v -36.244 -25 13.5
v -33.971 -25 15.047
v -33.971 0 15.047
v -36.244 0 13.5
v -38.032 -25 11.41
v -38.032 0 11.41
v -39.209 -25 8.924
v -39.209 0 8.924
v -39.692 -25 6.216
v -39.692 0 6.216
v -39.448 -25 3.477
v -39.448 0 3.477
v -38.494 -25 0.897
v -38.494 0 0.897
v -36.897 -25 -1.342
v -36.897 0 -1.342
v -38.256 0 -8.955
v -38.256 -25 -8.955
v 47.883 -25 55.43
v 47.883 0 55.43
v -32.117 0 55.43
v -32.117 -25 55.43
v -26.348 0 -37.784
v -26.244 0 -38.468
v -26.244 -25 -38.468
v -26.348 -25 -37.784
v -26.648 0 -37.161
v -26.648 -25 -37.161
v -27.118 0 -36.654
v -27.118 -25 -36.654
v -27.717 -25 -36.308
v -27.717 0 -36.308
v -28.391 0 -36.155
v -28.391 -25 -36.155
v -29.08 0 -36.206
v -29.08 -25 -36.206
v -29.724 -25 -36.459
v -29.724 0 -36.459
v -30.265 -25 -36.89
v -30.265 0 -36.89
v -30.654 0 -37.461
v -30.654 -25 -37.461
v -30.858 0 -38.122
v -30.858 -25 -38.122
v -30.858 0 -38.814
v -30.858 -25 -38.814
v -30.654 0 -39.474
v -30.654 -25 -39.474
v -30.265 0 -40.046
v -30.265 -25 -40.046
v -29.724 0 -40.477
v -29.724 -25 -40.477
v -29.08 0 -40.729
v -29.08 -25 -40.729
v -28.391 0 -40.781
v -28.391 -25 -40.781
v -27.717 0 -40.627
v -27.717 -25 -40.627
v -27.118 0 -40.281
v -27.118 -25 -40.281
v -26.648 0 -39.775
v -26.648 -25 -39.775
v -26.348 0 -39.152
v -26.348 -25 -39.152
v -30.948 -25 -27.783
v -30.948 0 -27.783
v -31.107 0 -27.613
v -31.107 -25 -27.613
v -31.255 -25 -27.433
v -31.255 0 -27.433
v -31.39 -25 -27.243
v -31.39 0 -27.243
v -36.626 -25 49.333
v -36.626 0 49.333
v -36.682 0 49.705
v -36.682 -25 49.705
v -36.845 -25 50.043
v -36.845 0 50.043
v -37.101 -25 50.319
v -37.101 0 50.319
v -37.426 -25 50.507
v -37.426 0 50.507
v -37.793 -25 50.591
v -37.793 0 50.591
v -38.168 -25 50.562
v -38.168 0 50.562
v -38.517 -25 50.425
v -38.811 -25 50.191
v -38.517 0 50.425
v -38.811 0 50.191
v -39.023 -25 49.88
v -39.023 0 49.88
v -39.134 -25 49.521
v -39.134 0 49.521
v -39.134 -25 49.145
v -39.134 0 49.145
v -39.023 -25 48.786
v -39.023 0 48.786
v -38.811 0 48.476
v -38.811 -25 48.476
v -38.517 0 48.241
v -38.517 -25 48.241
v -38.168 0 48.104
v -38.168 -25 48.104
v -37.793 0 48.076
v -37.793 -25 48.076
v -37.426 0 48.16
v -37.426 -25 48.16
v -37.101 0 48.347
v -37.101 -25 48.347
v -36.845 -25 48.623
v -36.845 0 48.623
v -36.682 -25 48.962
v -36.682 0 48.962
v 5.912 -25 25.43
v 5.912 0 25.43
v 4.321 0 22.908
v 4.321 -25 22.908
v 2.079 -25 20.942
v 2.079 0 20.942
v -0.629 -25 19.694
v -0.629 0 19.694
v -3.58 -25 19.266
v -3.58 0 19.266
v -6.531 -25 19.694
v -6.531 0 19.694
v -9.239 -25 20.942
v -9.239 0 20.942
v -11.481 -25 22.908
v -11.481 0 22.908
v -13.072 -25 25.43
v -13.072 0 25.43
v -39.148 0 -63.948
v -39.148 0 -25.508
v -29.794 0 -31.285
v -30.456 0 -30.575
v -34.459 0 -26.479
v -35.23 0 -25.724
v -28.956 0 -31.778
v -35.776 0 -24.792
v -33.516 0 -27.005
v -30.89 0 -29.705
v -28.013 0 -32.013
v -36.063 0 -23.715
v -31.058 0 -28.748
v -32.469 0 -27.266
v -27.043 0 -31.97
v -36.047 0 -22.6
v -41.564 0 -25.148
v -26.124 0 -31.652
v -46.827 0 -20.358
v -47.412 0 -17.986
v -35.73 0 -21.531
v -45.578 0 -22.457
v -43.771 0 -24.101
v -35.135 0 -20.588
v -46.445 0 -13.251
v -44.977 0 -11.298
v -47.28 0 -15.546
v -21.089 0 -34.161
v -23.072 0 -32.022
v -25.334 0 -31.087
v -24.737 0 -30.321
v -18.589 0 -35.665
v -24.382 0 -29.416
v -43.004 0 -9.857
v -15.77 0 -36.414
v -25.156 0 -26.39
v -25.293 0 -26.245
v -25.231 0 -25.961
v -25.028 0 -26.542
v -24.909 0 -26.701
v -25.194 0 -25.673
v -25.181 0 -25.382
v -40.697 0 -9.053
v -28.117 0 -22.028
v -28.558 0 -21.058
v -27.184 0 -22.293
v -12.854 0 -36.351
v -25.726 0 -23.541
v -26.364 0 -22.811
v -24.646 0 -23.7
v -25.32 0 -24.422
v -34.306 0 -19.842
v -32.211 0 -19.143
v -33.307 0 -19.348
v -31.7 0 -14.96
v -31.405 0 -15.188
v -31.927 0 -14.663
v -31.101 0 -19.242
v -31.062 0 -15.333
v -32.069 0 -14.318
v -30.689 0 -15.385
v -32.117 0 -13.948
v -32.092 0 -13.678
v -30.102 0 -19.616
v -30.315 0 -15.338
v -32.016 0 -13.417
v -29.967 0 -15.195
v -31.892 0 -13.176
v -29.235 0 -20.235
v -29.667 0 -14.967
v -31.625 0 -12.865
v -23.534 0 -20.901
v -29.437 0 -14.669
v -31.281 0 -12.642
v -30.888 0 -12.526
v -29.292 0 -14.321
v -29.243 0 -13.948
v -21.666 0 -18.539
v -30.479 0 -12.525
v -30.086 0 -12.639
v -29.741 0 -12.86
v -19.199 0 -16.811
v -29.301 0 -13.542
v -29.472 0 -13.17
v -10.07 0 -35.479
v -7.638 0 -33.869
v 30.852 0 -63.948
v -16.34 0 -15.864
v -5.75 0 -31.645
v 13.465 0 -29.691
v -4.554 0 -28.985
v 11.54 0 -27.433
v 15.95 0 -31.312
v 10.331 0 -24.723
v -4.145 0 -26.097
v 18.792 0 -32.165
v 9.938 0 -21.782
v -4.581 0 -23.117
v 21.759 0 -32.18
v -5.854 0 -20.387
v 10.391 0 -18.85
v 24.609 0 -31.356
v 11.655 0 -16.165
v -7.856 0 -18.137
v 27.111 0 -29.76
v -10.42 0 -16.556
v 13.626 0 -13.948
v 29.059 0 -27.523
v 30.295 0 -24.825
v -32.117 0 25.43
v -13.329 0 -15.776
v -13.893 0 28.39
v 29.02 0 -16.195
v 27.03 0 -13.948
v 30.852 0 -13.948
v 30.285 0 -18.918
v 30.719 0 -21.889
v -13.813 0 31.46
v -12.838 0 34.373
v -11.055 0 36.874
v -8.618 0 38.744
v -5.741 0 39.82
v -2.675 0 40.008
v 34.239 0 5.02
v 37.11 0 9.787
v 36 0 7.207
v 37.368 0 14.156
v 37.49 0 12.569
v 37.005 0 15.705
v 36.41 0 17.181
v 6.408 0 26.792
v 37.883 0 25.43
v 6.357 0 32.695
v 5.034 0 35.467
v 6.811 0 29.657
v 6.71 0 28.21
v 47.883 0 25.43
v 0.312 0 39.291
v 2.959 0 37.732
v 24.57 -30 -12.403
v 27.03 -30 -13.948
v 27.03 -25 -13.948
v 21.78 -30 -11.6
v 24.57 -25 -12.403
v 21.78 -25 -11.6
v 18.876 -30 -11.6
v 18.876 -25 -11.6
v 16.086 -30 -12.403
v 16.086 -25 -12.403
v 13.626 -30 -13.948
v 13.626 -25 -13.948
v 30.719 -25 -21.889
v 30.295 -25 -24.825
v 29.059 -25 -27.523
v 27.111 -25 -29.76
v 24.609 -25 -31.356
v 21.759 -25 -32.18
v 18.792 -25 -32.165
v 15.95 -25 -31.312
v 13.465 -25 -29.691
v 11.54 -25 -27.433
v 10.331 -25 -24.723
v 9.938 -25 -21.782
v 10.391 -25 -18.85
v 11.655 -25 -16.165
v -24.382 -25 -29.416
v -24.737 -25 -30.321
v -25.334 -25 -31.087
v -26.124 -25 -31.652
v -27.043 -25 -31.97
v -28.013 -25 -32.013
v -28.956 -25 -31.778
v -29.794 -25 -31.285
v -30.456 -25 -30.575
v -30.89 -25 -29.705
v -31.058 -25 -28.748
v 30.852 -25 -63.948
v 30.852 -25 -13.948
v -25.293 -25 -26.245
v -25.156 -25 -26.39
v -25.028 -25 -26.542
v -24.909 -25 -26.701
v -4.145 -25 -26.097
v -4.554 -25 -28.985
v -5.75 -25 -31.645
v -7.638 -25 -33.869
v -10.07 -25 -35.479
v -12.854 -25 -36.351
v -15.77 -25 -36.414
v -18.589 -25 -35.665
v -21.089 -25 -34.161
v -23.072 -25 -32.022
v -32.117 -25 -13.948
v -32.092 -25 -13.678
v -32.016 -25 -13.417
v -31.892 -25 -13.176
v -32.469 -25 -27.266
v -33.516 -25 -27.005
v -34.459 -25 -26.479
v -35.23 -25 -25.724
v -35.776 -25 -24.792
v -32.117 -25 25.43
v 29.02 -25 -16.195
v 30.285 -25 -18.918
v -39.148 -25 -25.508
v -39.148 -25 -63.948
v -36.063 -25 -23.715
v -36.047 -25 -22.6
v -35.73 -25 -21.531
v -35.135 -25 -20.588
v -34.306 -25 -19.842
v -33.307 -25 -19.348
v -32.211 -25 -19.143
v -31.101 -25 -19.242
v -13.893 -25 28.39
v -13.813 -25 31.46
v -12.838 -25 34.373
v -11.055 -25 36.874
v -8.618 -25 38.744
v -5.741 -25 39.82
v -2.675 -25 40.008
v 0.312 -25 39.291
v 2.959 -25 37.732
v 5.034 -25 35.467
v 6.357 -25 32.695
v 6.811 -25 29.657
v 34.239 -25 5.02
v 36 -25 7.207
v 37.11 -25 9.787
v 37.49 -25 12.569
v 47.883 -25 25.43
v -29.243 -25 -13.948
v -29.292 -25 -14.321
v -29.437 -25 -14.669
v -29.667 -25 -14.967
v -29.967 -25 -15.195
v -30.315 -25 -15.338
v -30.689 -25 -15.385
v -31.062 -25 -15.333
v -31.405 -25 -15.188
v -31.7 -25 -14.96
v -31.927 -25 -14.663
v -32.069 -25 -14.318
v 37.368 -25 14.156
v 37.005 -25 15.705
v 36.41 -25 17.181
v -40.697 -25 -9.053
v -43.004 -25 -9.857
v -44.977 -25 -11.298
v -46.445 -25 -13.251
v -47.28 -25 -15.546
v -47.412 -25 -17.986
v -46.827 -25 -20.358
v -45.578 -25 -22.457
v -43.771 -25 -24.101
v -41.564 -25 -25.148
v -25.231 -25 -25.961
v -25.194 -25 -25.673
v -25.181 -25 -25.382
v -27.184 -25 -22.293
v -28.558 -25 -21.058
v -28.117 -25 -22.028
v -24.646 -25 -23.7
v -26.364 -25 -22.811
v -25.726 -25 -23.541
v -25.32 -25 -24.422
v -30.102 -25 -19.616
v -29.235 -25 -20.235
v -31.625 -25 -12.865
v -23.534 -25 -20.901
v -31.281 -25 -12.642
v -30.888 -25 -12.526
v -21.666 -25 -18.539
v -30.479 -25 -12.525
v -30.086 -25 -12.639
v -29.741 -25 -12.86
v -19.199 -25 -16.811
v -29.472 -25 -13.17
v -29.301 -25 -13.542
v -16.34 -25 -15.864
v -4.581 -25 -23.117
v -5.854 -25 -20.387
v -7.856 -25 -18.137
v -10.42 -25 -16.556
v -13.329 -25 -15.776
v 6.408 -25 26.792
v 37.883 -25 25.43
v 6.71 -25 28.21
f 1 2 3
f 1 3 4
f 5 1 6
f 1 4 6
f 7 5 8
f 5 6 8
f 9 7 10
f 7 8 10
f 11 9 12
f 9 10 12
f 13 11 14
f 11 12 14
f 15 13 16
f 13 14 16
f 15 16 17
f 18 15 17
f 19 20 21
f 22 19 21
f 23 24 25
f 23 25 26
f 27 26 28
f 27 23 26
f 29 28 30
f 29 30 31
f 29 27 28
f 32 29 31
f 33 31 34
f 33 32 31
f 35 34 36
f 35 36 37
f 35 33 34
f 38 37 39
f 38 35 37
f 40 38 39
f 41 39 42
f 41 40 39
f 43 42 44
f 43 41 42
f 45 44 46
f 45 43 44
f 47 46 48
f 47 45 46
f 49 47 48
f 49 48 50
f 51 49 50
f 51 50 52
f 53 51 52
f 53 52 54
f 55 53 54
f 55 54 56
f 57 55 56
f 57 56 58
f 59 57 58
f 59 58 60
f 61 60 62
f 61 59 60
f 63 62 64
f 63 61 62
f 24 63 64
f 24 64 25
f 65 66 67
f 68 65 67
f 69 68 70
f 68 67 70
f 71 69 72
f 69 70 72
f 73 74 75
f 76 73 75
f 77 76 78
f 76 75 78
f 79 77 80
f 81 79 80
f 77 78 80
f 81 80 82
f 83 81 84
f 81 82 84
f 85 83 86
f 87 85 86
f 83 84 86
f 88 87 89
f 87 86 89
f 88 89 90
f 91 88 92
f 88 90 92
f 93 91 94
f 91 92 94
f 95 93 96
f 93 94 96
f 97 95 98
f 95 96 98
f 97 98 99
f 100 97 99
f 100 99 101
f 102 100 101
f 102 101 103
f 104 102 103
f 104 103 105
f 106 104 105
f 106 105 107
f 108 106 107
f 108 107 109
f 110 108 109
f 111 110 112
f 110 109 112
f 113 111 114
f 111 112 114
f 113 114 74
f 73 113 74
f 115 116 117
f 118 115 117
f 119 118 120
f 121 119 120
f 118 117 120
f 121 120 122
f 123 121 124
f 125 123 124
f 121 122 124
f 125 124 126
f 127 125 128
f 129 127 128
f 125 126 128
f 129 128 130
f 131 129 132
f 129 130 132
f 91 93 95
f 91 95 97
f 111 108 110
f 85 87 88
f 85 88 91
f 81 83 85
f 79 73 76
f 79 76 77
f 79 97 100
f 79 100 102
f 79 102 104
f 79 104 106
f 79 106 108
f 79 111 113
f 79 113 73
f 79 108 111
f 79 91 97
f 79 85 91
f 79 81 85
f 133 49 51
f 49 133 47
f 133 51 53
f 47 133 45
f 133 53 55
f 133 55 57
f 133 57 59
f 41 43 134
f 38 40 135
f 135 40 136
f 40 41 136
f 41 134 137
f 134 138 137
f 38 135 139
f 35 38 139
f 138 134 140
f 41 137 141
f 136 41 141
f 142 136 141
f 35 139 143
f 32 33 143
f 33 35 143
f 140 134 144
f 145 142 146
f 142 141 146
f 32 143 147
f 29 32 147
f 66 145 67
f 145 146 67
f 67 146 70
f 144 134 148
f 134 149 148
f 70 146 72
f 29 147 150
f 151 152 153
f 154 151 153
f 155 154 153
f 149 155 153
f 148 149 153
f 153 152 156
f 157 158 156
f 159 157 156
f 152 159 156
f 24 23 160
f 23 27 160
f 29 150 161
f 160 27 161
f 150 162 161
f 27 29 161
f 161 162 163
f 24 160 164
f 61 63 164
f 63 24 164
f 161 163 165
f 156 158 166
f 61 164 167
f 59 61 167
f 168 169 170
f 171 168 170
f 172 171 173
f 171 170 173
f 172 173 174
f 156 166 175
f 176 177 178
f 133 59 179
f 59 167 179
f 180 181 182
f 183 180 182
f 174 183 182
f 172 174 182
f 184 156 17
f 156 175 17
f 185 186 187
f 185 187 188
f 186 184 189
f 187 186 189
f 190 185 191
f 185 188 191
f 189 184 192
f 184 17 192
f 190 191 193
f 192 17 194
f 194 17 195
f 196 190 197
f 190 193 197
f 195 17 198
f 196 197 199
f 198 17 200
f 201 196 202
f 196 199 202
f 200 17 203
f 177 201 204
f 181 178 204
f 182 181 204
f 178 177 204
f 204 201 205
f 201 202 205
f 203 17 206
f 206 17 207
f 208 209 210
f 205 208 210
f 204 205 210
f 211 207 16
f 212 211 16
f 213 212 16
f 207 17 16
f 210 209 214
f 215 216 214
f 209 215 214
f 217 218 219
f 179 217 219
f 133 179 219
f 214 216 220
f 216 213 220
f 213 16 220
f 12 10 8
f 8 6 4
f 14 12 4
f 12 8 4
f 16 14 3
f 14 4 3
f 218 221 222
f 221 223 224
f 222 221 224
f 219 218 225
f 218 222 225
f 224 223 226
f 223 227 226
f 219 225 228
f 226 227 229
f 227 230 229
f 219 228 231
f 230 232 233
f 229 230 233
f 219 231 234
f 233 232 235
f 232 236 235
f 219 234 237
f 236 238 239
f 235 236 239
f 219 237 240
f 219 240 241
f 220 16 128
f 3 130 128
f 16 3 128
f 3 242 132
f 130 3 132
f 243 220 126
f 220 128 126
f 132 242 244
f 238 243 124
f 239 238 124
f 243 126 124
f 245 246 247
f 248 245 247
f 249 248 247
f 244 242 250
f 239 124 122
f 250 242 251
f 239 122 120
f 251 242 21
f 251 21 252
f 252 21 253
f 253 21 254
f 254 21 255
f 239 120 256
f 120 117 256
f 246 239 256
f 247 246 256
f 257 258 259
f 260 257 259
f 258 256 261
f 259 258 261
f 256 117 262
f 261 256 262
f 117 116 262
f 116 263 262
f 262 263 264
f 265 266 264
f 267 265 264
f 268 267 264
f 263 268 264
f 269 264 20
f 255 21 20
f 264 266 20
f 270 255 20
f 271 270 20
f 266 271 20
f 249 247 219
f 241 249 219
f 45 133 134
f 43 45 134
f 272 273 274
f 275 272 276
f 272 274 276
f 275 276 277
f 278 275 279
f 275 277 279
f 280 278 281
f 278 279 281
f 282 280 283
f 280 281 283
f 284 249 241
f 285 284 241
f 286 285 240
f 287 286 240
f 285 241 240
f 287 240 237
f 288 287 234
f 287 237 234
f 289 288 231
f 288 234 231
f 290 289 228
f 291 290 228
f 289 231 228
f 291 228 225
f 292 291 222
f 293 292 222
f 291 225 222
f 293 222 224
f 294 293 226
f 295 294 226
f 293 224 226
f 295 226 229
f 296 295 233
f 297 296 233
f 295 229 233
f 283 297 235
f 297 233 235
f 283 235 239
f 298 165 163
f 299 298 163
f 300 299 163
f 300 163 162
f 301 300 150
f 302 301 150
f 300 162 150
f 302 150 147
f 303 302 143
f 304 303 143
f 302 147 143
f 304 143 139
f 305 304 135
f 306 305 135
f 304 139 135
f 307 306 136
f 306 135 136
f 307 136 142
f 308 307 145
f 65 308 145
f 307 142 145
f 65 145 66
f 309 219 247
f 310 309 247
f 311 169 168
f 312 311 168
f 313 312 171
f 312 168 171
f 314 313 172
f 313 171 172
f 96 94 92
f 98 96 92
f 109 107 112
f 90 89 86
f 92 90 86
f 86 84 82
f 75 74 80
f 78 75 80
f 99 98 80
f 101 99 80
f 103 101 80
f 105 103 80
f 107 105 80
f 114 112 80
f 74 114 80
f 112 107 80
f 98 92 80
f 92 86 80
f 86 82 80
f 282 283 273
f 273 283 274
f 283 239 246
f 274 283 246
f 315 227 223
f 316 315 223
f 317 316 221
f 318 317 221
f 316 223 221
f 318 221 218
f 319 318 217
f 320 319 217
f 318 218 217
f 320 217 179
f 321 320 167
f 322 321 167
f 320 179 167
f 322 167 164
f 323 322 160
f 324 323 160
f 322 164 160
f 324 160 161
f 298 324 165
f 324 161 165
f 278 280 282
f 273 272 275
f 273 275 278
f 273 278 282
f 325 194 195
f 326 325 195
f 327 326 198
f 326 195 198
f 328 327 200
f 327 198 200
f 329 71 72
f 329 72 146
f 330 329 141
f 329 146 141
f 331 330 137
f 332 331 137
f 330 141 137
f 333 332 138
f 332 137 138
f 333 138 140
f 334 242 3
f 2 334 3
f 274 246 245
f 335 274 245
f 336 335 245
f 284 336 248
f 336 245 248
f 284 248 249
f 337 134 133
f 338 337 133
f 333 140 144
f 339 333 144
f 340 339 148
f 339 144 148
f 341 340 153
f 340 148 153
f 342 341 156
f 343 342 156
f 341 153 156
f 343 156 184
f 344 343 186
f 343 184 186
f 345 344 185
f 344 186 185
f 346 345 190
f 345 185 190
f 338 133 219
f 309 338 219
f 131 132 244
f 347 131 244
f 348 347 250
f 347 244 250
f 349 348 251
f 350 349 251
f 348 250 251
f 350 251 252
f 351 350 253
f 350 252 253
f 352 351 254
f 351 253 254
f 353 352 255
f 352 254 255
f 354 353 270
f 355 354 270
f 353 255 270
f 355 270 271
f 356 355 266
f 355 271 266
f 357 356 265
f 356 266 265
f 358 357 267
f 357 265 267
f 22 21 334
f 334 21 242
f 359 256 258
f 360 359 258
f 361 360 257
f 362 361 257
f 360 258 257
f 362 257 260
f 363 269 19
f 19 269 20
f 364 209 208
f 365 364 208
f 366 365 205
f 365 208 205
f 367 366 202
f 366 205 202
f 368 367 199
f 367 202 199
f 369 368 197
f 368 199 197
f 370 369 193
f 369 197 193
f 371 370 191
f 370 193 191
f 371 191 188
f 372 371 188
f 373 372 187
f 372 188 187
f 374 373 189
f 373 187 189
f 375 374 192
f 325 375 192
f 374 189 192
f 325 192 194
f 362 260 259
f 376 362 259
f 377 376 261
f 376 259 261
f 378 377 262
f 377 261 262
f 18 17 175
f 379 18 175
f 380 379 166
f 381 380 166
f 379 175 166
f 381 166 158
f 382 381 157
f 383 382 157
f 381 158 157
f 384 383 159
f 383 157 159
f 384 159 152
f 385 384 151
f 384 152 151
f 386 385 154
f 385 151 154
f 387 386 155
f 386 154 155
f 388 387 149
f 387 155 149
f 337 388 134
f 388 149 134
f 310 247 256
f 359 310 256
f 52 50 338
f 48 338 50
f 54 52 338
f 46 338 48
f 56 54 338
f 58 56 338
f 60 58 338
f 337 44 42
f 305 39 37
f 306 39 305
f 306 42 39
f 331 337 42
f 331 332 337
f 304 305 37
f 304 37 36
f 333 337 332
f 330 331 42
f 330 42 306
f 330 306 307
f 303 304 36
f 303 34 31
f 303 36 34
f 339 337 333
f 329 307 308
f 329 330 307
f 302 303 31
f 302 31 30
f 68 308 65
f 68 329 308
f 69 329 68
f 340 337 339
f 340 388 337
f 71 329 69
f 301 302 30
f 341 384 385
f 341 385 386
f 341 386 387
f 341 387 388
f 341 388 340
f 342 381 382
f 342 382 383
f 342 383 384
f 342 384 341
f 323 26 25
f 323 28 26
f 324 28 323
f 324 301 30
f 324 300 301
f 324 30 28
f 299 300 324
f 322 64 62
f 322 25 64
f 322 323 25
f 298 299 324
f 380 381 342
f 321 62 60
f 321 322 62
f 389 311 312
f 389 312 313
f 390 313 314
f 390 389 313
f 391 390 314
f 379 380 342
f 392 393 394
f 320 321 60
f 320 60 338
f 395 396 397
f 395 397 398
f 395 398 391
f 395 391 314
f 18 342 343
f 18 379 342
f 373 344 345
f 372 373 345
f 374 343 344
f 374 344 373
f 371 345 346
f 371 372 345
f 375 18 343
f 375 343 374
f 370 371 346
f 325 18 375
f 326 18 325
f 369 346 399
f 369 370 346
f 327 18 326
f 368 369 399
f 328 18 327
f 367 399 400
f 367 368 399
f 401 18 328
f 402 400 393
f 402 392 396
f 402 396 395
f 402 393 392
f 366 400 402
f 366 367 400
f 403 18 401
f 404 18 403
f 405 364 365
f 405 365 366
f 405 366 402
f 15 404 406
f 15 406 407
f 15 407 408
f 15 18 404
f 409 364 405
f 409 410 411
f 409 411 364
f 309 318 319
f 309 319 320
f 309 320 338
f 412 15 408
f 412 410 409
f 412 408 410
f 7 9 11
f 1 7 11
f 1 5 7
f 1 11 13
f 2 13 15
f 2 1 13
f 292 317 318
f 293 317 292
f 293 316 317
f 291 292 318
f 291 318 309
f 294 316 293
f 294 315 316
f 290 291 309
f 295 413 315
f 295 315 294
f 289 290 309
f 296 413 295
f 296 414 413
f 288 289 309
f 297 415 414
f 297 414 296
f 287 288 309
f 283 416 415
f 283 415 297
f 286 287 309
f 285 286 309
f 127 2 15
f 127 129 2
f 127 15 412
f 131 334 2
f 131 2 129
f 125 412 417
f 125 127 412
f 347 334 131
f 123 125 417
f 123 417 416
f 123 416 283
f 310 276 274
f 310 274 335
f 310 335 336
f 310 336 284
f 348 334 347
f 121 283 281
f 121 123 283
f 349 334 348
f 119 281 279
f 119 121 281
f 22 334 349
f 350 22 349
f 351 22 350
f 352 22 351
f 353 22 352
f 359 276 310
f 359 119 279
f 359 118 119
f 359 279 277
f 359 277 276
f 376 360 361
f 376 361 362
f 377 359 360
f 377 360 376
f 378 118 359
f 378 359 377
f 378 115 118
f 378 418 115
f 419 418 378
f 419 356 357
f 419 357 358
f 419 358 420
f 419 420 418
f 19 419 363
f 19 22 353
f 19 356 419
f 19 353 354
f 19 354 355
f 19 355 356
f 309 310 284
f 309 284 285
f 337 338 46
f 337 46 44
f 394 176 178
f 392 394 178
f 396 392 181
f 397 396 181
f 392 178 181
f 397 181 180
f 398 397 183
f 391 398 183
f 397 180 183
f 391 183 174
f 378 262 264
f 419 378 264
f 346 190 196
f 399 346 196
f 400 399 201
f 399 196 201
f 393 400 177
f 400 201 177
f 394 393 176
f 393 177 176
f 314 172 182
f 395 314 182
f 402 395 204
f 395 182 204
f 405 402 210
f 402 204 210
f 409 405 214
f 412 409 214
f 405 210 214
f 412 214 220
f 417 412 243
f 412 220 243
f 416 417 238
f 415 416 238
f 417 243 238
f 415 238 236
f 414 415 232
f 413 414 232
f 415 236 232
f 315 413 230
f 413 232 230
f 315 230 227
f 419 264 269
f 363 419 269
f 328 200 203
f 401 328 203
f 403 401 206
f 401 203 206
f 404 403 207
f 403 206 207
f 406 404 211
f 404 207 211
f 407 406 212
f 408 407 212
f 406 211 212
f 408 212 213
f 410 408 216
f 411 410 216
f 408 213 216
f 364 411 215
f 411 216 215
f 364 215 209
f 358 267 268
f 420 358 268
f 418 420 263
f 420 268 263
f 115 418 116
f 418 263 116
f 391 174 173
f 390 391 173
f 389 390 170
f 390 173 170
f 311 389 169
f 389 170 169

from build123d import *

# Parameters (mm, degrees)
F1_DEPTH = 25
F2_DEPTH = 30
F0_R     = 2.3197134373
F3_DEPTH = 25
F0_R_2   = 1.2608238745


with BuildPart() as f1:
    # F0 (on Front) → F1 (new body)
    with BuildSketch(Plane.XZ):
        with BuildLine():
            Line((-36.8970455988, -1.3415312964), (-38.2563615468, -8.9548247595))
            ThreePointArc((-38.2563615468, -8.9548247595), (-34.5600498563, -10.2898813947), (-31.8921704478, -13.1756249373))
            ThreePointArc((-31.8921704478, -13.1756249373), (-30.2780449791, -12.5680611078), (-29.2430992407, -13.9477067703))
            Line((-29.2430992407, -13.9477067703), (13.6264225575, -13.9477067703))
            ThreePointArc((13.6264225575, -13.9477067703), (20.327998141, -11.4977905039), (27.0295737244, -13.9477067703))
            Line((27.0295737244, -13.9477067703), (30.8521840286, -13.9477067703))
            Line((30.8521840286, -13.9477067703), (34.2387321722, 5.0197635093))
            ThreePointArc((34.2387321722, 5.0197635093), (16.8699466245, 14.3954719517), (36.4101090954, 17.1812700081))
            Line((36.4101090954, 17.1812700081), (37.8828033788, 25.4295759134))
            Line((37.8828033788, 25.4295759134), (5.9121937531, 25.4295759134))
            ThreePointArc((5.9121937531, 25.4295759134), (-3.5799022512, 19.265938237), (-13.0719982556, 25.4295759134))
            Line((-13.0719982556, 25.4295759134), (-32.1171966212, 25.4295759134))
            Line((-32.1171966212, 25.4295759134), (-33.9708996127, 15.0473061488))
            ThreePointArc((-33.9708996127, 15.0473061488), (-23.8546677668, 14.6023681954), (-18.9206845351, 5.7597483341))
            ThreePointArc((-18.9206845351, 5.7597483341), (-25.4938465616, -3.9043311549), (-36.8970455988, -1.3415312964))
        make_face()
        with BuildLine():
            ThreePointArc((27.0295737244, -13.9477067703), (20.327998141, -11.4977905039), (13.6264225575, -13.9477067703))
            Line((13.6264225575, -13.9477067703), (27.0295737244, -13.9477067703))
        make_face()
    extrude(amount=F1_DEPTH)

    # F0 (on Front) → F2 (join)
    with BuildSketch(Plane.XZ):
        with BuildLine():
            ThreePointArc((27.0295737244, -13.9477067703), (20.327998141, -11.4977905039), (13.6264225575, -13.9477067703))
            Line((13.6264225575, -13.9477067703), (27.0295737244, -13.9477067703))
        make_face()
    extrude(amount=F2_DEPTH)

    # F0 (on Front) → F3 (join)
    with BuildSketch(Plane.XZ):
        with BuildLine():
            Line((-38.2563615468, -8.9548247595), (-39.1478159714, -13.9477067703))
            Line((-39.1478159714, -13.9477067703), (-32.1171966212, -13.9477067703))
            ThreePointArc((-32.1171966212, -13.9477067703), (-32.0597935936, -13.5456038184), (-31.8921704478, -13.1756249373))
            ThreePointArc((-31.8921704478, -13.1756249373), (-34.5600498563, -10.2898813947), (-38.2563615468, -8.9548247595))
        make_face()
        with BuildLine():
            Line((-32.1171966212, -13.9477067703), (-39.1478159714, -13.9477067703))
            Line((-39.1478159714, -13.9477067703), (-39.1478159714, -25.5079631141))
            ThreePointArc((-39.1478159714, -25.5079631141), (-37.4242994609, -25.3270577869), (-35.7759086803, -24.7922272215))
            ThreePointArc((-35.7759086803, -24.7922272215), (-35.1346869248, -20.5881831631), (-31.1005712876, -19.2424258261))
            ThreePointArc((-31.1005712876, -19.2424258261), (-30.9108182069, -18.2327612754), (-30.8472425547, -17.2073896974))
            ThreePointArc((-30.8472425547, -17.2073896974), (-30.9010050472, -16.2641884324), (-31.0615960895, -15.3332053234))
            ThreePointArc((-31.0615960895, -15.3332053234), (-31.8232289681, -14.8186112891), (-32.1171966212, -13.9477067703))
        make_face()
        with BuildLine():
            Line((-39.1478159714, -25.5079631141), (-39.1478159714, -13.9477067703))
            Line((-39.1478159714, -13.9477067703), (-38.2563615468, -8.9548247595))
            ThreePointArc((-38.2563615468, -8.9548247595), (-47.4363785787, -16.7610165897), (-39.1478159714, -25.5079631141))
        make_face()
        with BuildLine():
            ThreePointArc((-35.7759086803, -24.7922272215), (-37.4242994609, -25.3270577869), (-39.1478159714, -25.5079631141))
            Line((-39.1478159714, -25.5079631141), (-39.1478159714, -63.9477067703))
            Line((-39.1478159714, -63.9477067703), (30.8521840286, -63.9477067703))
            Line((30.8521840286, -63.9477067703), (30.8521840286, -13.9477067703))
            Line((30.8521840286, -13.9477067703), (27.0295737244, -13.9477067703))
            ThreePointArc((27.0295737244, -13.9477067703), (29.7514687642, -17.510578657), (30.71880327, -21.8885956329))
            ThreePointArc((30.71880327, -21.8885956329), (15.949981165, -31.3120662561), (13.6264225575, -13.9477067703))
            Line((13.6264225575, -13.9477067703), (-29.2430992407, -13.9477067703))
            ThreePointArc((-29.2430992407, -13.9477067703), (-29.8092434122, -15.0907878075), (-31.0615960895, -15.3332053234))
            ThreePointArc((-31.0615960895, -15.3332053234), (-30.9010050472, -16.2641884324), (-30.8472425547, -17.2073896974))
            ThreePointArc((-30.8472425547, -17.2073896974), (-30.9108182069, -18.2327612754), (-31.1005712876, -19.2424258261))
            ThreePointArc((-31.1005712876, -19.2424258261), (-29.2348911506, -20.2350073875), (-28.1168713895, -22.0283317708))
            ThreePointArc((-28.1168713895, -22.0283317708), (-26.0187057491, -23.153295251), (-25.1810509111, -25.3817871757))
            ThreePointArc((-25.1810509111, -25.3817871757), (-25.209190214, -25.817226894), (-25.2931400278, -26.2454231077))
            ThreePointArc((-25.2931400278, -26.2454231077), (-25.0909422893, -26.4646669846), (-24.908839255, -26.7008666627))
            ThreePointArc((-24.908839255, -26.7008666627), (-14.8376440321, -15.7106090516), (-4.1447894931, -26.0970231288))
            ThreePointArc((-4.1447894931, -26.0970231288), (-12.8539883778, -36.3508532263), (-24.3821109254, -29.4159006375))
            ThreePointArc((-24.3821109254, -29.4159006375), (-28.4932406364, -31.9295574903), (-30.9476780862, -27.7828003139))
            ThreePointArc((-30.9476780862, -27.7828003139), (-31.1826286879, -27.5241383485), (-31.3896450432, -27.2426209845))
            ThreePointArc((-31.3896450432, -27.2426209845), (-34.0051544965, -26.7734902048), (-35.7759086803, -24.7922272215))
        make_face()
        with Locations((-28.5642116289, -38.4677797556)):
            Circle(F0_R, mode=Mode.SUBTRACT)
        with BuildLine():
            Line((-36.8970455988, -1.3415312964), (-38.2563615468, -8.9548247595))
            ThreePointArc((-38.2563615468, -8.9548247595), (-34.5600498563, -10.2898813947), (-31.8921704478, -13.1756249373))
            ThreePointArc((-31.8921704478, -13.1756249373), (-30.2780449791, -12.5680611078), (-29.2430992407, -13.9477067703))
            Line((-29.2430992407, -13.9477067703), (13.6264225575, -13.9477067703))
            ThreePointArc((13.6264225575, -13.9477067703), (20.327998141, -11.4977905039), (27.0295737244, -13.9477067703))
            Line((27.0295737244, -13.9477067703), (30.8521840286, -13.9477067703))
            Line((30.8521840286, -13.9477067703), (34.2387321722, 5.0197635093))
            ThreePointArc((34.2387321722, 5.0197635093), (16.8699466245, 14.3954719517), (36.4101090954, 17.1812700081))
            Line((36.4101090954, 17.1812700081), (37.8828033788, 25.4295759134))
            Line((37.8828033788, 25.4295759134), (5.9121937531, 25.4295759134))
            ThreePointArc((5.9121937531, 25.4295759134), (-3.5799022512, 19.265938237), (-13.0719982556, 25.4295759134))
            Line((-13.0719982556, 25.4295759134), (-32.1171966212, 25.4295759134))
            Line((-32.1171966212, 25.4295759134), (-33.9708996127, 15.0473061488))
            ThreePointArc((-33.9708996127, 15.0473061488), (-23.8546677668, 14.6023681954), (-18.9206845351, 5.7597483341))
            ThreePointArc((-18.9206845351, 5.7597483341), (-25.4938465616, -3.9043311549), (-36.8970455988, -1.3415312964))
        make_face()
        with BuildLine():
            ThreePointArc((-33.9708996127, 15.0473061488), (-39.540531436, 7.5860932242), (-36.8970455988, -1.3415312964))
            Line((-36.8970455988, -1.3415312964), (-33.9708996127, 15.0473061488))
        make_face()
        with BuildLine():
            Line((-33.9708996127, 15.0473061488), (-36.8970455988, -1.3415312964))
            ThreePointArc((-36.8970455988, -1.3415312964), (-25.4938465616, -3.9043311549), (-18.9206845351, 5.7597483341))
            ThreePointArc((-18.9206845351, 5.7597483341), (-23.8546677668, 14.6023681954), (-33.9708996127, 15.0473061488))
        make_face()
        with BuildLine():
            Line((-32.1171966212, 55.4295759134), (-32.1171966212, 25.4295759134))
            Line((-32.1171966212, 25.4295759134), (-13.0719982556, 25.4295759134))
            ThreePointArc((-13.0719982556, 25.4295759134), (-5.740725171, 39.8203881619), (6.8109028777, 29.6567433659))
            ThreePointArc((6.8109028777, 29.6567433659), (6.5837425447, 27.4959204462), (5.9121937531, 25.4295759134))
            Line((5.9121937531, 25.4295759134), (37.8828033788, 25.4295759134))
            Line((37.8828033788, 25.4295759134), (47.8828033788, 25.4295759134))
            Line((47.8828033788, 25.4295759134), (47.8828033788, 55.4295759134))
            Line((47.8828033788, 55.4295759134), (-32.1171966212, 55.4295759134))
        make_face()
        with BuildLine():
            ThreePointArc((36.4101090954, 17.1812700081), (16.8699466245, 14.3954719517), (34.2387321722, 5.0197635093))
            Line((34.2387321722, 5.0197635093), (36.4101090954, 17.1812700081))
        make_face()
        with BuildLine():
            Line((36.4101090954, 17.1812700081), (34.2387321722, 5.0197635093))
            ThreePointArc((34.2387321722, 5.0197635093), (36.6424814014, 8.4593128941), (37.4897935254, 12.5691270616))
            ThreePointArc((37.4897935254, 12.5691270616), (37.2162724179, 14.9375432533), (36.4101090954, 17.1812700081))
        make_face()
    extrude(amount=F3_DEPTH)


with BuildPart() as f3:
    # F0 (on Front) → F3, piece 2 (new body)
    with BuildSketch(Plane.XZ):
        with Locations((-37.8869920969, 49.3332110345)):
            Circle(F0_R_2)
    extrude(amount=F3_DEPTH)


solid = Compound([f1.part, f3.part])
